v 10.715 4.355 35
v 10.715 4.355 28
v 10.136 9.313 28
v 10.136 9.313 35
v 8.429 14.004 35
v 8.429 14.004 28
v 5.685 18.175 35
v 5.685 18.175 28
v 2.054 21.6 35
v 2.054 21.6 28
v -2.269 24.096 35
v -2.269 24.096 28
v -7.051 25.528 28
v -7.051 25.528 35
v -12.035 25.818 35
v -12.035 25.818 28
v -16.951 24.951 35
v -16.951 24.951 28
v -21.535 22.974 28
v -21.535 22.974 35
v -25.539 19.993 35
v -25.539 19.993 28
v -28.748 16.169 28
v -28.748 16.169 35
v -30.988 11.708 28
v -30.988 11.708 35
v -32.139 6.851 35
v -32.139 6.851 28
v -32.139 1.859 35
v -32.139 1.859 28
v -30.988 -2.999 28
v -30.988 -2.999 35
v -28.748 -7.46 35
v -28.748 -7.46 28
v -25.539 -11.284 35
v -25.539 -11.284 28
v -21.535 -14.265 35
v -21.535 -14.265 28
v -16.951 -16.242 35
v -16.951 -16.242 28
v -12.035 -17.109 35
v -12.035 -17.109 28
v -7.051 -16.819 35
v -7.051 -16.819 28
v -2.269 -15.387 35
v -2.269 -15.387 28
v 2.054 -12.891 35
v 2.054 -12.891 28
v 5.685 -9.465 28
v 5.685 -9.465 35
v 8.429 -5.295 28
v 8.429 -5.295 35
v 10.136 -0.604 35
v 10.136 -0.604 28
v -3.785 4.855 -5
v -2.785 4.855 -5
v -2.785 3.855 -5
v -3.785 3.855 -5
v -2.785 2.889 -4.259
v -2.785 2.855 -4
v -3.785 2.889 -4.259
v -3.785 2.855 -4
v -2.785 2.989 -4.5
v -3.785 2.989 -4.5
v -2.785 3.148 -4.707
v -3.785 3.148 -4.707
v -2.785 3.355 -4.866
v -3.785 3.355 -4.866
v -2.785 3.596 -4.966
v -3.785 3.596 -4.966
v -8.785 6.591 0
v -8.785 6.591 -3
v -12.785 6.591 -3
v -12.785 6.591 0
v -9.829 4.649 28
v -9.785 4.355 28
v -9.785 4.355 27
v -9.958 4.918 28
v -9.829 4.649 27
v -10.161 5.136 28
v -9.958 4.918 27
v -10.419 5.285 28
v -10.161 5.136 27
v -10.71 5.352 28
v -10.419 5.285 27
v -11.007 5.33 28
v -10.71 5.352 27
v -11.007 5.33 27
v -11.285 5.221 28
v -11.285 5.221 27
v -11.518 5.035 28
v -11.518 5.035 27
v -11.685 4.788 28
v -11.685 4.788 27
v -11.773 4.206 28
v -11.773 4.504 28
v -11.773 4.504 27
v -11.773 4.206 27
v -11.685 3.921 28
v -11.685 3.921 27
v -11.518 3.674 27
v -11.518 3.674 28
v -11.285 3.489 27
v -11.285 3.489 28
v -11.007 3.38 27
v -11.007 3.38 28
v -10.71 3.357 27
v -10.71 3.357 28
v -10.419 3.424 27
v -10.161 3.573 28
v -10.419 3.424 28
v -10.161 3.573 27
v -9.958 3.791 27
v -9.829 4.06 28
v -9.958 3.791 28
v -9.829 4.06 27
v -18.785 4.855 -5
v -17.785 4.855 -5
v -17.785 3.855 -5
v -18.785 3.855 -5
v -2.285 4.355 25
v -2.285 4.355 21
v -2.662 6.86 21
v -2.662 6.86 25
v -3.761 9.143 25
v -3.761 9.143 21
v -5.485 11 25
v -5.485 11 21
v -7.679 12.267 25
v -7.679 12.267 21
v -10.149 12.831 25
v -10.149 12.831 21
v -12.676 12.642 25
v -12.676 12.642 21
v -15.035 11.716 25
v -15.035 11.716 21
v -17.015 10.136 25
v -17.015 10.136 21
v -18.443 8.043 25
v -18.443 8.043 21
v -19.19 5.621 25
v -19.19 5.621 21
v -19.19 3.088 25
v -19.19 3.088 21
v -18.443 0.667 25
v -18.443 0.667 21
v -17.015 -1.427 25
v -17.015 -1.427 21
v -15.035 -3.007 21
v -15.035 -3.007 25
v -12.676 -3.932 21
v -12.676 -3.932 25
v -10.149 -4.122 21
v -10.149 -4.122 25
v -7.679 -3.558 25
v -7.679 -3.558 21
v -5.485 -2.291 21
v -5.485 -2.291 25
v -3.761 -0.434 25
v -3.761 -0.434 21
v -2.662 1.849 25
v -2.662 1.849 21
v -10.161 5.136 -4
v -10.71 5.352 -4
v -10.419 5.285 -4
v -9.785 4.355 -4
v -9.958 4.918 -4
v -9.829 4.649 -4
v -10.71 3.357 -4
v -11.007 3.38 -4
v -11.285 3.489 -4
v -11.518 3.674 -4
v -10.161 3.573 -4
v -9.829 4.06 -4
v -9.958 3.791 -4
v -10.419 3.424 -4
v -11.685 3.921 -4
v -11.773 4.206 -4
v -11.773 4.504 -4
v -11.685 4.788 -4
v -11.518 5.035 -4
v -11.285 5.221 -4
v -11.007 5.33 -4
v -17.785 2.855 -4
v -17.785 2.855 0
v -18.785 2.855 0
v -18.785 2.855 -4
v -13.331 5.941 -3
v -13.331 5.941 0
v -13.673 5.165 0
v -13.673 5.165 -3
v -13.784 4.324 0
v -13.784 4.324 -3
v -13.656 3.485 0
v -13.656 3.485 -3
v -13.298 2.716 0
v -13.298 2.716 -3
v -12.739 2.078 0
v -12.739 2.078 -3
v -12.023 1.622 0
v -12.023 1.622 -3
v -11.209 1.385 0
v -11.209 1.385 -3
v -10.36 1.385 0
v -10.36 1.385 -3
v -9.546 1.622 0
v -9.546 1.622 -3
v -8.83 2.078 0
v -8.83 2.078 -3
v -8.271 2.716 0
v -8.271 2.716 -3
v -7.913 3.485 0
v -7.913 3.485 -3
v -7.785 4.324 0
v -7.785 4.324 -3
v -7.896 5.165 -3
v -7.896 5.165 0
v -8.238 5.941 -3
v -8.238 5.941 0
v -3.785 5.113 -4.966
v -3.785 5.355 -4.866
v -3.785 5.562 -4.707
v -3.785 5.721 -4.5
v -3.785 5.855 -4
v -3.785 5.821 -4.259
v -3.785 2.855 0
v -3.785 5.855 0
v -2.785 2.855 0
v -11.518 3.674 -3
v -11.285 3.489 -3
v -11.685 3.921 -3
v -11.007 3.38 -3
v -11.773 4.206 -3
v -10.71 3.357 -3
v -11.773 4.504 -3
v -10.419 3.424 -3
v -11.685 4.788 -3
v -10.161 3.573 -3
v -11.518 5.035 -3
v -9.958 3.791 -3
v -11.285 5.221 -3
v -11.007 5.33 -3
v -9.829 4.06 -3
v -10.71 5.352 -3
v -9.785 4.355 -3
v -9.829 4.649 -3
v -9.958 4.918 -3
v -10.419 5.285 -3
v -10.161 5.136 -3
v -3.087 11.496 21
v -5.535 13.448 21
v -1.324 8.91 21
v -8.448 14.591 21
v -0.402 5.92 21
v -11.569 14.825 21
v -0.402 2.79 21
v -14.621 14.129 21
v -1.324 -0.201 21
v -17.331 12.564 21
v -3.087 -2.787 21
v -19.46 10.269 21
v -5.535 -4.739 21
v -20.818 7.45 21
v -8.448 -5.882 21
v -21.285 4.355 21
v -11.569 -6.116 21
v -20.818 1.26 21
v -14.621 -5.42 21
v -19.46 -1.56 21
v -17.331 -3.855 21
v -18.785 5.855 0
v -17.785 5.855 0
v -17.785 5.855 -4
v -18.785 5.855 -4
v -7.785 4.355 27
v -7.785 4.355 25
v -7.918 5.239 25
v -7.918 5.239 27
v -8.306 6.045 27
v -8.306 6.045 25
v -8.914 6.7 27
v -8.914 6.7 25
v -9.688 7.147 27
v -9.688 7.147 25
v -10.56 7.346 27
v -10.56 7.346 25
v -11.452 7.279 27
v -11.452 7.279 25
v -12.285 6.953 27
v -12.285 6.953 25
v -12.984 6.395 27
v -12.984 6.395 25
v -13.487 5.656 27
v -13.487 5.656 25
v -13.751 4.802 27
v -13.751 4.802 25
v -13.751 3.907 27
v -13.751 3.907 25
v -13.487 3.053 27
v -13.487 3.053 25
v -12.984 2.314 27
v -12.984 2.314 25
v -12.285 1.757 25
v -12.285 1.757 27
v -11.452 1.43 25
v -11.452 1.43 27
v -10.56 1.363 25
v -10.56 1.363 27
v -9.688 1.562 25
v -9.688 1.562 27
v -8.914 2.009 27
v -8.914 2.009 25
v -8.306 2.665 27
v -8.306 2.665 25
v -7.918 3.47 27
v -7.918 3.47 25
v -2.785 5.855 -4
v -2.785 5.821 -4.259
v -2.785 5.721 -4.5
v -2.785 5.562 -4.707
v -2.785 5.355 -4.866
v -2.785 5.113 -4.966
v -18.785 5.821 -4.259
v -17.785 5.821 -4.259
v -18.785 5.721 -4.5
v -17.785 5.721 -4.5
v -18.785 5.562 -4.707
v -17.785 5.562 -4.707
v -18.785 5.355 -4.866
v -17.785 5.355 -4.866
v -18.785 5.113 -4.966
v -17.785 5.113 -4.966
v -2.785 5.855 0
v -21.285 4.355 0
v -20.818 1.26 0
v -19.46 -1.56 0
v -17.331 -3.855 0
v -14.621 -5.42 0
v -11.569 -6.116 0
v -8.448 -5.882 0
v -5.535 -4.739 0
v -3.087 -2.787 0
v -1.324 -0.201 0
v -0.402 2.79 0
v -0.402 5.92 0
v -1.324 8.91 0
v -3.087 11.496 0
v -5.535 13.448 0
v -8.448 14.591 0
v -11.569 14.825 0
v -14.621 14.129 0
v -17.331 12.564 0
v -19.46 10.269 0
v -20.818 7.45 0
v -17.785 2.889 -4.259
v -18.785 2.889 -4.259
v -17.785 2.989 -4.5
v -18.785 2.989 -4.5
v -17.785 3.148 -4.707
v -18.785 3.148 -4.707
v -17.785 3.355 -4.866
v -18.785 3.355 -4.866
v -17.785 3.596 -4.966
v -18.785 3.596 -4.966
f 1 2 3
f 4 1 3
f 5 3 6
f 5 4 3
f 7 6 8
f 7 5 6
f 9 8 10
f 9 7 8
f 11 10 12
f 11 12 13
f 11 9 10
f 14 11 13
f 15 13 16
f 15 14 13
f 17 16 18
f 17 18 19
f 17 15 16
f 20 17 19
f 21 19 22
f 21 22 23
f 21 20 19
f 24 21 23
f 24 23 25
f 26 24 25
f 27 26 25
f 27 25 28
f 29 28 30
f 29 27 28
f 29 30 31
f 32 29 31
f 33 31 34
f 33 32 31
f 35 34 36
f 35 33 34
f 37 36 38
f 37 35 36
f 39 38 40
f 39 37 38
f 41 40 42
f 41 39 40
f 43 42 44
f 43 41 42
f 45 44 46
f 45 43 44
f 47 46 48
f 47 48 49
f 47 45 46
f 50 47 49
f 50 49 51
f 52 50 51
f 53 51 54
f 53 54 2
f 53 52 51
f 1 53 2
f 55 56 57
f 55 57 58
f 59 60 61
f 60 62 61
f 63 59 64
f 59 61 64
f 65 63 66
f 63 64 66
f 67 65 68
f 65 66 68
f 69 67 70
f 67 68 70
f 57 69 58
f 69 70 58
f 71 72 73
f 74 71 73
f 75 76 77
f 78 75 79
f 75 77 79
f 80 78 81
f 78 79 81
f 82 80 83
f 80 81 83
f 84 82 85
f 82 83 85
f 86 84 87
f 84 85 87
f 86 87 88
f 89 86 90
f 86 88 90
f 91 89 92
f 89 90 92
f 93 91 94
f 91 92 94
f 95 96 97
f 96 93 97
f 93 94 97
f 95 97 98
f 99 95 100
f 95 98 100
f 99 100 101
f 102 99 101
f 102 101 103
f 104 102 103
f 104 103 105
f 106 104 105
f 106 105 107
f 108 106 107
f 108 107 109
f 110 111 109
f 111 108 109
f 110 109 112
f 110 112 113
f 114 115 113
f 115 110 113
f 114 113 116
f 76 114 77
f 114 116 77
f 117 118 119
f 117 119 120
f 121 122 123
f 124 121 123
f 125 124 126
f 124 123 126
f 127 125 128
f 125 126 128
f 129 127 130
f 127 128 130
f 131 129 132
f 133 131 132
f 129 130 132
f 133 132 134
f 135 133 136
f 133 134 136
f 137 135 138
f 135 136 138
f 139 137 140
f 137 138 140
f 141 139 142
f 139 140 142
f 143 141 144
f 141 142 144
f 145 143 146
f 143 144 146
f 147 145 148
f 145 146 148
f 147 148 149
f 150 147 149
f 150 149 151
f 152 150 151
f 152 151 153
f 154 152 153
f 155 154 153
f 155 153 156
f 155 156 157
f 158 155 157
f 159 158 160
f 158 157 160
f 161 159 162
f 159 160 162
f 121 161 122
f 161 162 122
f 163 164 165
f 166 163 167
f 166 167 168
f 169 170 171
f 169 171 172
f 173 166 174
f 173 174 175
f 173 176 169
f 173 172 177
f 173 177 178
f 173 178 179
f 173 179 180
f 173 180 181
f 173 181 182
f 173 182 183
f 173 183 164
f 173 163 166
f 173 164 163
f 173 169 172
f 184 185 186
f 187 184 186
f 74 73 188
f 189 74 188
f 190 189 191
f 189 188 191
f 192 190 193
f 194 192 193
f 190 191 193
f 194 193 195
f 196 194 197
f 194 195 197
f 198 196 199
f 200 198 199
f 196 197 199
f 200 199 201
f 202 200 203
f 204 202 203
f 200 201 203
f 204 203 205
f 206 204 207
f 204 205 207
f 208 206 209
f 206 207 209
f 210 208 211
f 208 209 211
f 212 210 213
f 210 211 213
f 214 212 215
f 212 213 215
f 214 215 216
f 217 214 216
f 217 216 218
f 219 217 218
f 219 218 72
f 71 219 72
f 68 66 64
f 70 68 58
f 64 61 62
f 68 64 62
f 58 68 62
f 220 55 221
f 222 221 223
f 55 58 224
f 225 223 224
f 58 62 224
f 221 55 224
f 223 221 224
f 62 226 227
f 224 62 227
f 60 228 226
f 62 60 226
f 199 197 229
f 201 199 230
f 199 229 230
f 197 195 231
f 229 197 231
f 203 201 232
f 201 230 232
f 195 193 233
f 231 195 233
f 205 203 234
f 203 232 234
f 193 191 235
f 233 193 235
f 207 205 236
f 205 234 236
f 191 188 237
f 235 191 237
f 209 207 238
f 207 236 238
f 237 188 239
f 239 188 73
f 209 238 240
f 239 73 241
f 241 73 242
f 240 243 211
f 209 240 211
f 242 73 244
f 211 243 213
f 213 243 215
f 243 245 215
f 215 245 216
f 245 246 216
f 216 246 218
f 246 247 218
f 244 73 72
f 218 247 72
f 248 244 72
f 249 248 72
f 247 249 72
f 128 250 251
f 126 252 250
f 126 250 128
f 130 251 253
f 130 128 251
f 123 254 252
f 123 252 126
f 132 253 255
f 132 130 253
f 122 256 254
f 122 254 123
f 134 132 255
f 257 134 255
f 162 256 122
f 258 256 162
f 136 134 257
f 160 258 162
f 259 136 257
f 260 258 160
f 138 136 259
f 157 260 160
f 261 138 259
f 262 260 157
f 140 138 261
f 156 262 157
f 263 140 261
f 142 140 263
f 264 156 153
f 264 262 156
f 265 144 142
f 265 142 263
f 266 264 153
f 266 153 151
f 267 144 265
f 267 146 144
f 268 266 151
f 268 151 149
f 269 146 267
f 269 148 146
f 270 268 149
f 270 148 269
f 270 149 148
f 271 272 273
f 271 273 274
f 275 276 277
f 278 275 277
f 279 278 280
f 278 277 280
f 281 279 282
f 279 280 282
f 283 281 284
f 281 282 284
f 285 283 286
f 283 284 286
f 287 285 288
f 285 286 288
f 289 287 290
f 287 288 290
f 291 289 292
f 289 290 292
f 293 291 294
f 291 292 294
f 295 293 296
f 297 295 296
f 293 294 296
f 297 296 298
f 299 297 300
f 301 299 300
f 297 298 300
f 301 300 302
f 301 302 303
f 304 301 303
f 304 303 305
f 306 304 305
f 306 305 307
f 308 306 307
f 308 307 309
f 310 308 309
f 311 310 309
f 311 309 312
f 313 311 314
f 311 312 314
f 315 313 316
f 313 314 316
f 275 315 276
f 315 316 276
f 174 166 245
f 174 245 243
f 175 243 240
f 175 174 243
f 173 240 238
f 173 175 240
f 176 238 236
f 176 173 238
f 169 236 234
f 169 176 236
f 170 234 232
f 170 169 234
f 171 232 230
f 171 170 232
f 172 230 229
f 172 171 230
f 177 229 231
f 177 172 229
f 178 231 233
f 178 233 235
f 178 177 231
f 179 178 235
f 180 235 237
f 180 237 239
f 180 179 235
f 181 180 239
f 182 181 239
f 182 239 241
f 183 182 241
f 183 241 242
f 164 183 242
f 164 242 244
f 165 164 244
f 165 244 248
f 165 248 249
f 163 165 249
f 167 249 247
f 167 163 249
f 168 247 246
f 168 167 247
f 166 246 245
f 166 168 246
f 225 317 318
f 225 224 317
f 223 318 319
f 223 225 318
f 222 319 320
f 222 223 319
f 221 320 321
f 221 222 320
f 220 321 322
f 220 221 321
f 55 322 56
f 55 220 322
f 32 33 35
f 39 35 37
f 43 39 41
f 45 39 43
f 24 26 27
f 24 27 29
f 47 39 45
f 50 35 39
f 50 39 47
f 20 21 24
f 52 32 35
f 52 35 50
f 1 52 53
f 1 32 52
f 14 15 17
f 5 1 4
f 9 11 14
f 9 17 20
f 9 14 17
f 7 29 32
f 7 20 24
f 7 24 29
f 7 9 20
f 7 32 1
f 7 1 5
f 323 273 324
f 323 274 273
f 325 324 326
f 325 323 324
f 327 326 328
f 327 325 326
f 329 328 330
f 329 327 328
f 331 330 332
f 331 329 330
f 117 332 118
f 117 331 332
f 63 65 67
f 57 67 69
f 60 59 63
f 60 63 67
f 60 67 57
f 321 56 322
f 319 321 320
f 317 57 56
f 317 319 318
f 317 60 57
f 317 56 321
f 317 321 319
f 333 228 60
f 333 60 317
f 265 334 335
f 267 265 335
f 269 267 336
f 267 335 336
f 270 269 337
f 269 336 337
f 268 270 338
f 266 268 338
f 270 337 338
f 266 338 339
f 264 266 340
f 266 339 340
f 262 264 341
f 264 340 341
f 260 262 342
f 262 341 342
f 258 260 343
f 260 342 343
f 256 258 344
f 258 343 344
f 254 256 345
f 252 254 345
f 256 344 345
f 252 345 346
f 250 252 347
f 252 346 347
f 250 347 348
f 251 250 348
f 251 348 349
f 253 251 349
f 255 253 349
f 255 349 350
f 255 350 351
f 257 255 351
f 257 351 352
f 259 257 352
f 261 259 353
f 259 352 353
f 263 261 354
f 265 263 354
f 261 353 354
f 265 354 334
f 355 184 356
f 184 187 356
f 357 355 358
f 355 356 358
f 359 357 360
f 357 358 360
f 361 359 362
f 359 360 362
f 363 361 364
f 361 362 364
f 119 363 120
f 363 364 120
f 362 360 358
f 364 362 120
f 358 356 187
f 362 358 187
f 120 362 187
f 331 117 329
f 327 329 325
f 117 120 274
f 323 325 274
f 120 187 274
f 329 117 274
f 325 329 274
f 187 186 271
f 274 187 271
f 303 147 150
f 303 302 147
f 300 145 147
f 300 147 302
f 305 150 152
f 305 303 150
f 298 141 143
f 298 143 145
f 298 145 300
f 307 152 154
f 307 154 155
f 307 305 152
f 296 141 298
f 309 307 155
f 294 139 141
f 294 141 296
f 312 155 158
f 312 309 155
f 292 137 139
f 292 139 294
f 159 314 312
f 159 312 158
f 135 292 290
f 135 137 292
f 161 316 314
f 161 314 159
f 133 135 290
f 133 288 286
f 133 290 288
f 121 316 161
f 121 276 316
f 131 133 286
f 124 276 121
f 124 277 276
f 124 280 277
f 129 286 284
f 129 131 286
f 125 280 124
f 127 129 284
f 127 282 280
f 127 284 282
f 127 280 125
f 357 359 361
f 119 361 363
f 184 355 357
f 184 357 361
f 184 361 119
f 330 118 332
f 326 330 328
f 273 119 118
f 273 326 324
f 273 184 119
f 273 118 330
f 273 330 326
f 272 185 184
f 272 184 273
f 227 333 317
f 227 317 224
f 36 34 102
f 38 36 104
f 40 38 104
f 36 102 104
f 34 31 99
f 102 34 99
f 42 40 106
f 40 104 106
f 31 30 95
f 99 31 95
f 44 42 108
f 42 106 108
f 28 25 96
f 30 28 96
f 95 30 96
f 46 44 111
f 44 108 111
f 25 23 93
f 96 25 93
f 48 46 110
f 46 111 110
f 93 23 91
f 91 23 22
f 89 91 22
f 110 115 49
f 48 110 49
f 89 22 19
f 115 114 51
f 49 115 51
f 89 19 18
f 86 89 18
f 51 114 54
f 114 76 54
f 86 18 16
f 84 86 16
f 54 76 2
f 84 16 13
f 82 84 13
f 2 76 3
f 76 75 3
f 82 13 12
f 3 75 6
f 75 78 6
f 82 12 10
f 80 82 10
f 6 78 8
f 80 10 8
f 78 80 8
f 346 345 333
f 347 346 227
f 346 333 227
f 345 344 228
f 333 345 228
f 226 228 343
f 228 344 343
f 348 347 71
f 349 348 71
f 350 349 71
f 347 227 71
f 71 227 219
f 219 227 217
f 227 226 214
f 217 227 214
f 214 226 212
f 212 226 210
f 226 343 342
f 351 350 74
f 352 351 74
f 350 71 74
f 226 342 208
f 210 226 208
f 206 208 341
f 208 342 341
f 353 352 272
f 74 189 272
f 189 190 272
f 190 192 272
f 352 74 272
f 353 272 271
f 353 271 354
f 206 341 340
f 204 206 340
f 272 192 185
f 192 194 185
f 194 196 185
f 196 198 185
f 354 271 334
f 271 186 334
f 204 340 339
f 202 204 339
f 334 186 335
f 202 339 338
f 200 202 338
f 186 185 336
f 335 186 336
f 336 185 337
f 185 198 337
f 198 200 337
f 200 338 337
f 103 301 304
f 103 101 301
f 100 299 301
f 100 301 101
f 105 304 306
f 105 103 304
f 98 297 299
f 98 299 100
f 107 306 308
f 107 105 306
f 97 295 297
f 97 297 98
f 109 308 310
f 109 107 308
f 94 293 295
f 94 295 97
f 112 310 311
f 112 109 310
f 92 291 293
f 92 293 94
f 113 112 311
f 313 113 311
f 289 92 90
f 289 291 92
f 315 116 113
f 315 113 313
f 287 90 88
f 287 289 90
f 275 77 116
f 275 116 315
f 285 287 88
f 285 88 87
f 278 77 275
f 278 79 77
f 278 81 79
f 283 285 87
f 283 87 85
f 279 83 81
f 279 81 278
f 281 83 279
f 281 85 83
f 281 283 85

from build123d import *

# Parameters (mm, degrees)
ESQUISSE1_R        = 10.5
BOSS_EXTRU_1_DEPTH = 21
ESQUISSE2_R        = 8.5
BOSS_EXTRU_2_DEPTH = 4
ESQUISSE3_R        = 3
BOSS_EXTRU_3_DEPTH = 2
ESQUISSE4_R        = 1
BOSS_EXTRU_4_DEPTH = 8
ESQUISSE5_W        = 1
ESQUISSE5_H        = 3
BOSS_EXTRU_5_DEPTH = 5
CONG_1_R           = 1
BOSS_EXTRU_6_START = 3
BOSS_EXTRU_6_DEPTH = 3
BOSS_EXTRU_7_START = 1
ESQUISSE7_R        = 1
BOSS_EXTRU_7_DEPTH = 1
ESQUISSE8_R        = 21.5
BOSS_EXTRU_8_DEPTH = 7


with BuildPart() as part:
    # Esquisse1 → Boss.-Extru.1 (new body)
    with BuildSketch(Plane.XY):
        with Locations((-10.784512349, 4.354613187)):
            Circle(ESQUISSE1_R)
    extrude(amount=BOSS_EXTRU_1_DEPTH)

    # Esquisse2 → Boss.-Extru.2 (add)
    with BuildSketch(Plane.XY.offset(21)):
        with Locations((-10.784512349, 4.354613187)):
            Circle(ESQUISSE2_R)
    extrude(amount=BOSS_EXTRU_2_DEPTH)

    # Esquisse3 → Boss.-Extru.3 (add)
    with BuildSketch(Plane.XY.offset(25)):
        with Locations((-10.784512349, 4.354613187)):
            Circle(ESQUISSE3_R)
    extrude(amount=BOSS_EXTRU_3_DEPTH)

    # Esquisse4 → Boss.-Extru.4 (add)
    with BuildSketch(Plane.XY.offset(27)):
        with Locations((-10.784512349, 4.354613187)):
            Circle(ESQUISSE4_R)
    extrude(amount=BOSS_EXTRU_4_DEPTH)

    # Esquisse5 → Boss.-Extru.5 (add)
    with BuildSketch(Plane(origin=(0, 0, 0), x_dir=(-1, 0, 0), z_dir=(0, 0, -1))):
        with Locations((18.284512349, 4.354613187)):
            Rectangle(ESQUISSE5_W, ESQUISSE5_H)
        with Locations((3.284512349, 4.354613187)):
            Rectangle(ESQUISSE5_W, ESQUISSE5_H)
    extrude(amount=BOSS_EXTRU_5_DEPTH)

    # Congé1
    cong_1_edges = [part.edges().sort_by_distance(p)[0] for p in [
        (-18.284512349, 2.854613187, -5),
        (-18.284512349, 5.854613187, -5),
        (-3.284512349, 2.854613187, -5),
        (-3.284512349, 5.854613187, -5),
    ]]
    fillet(cong_1_edges, radius=CONG_1_R)

    # Esquisse6 → Boss.-Extru.6 (add)
    with BuildSketch(Plane(origin=(0, 0, 0), x_dir=(-1, 0, 0), z_dir=(0, 0, -1)).offset(BOSS_EXTRU_6_START)):
        with BuildLine():
            Line((8.784512349, 6.590681164), (12.784512349, 6.590681164))
            ThreePointArc((12.784512349, 6.590681164), (10.784512349, 1.354613187), (8.784512349, 6.590681164))
        make_face()
    extrude(amount=-BOSS_EXTRU_6_DEPTH)

    # Esquisse7 → Boss.-Extru.7 (add)
    with BuildSketch(Plane(origin=(0, 0, -3), x_dir=(-1, 0, 0), z_dir=(0, 0, -1)).offset(BOSS_EXTRU_7_START)):
        with Locations((10.784512349, 4.354613187)):
            Circle(ESQUISSE7_R)
    extrude(amount=-BOSS_EXTRU_7_DEPTH)

    # Esquisse8 → Boss.-Extru.8 (add)
    with BuildSketch(Plane.XY.offset(35)):
        with Locations((-10.784512349, 4.354613187)):
            Circle(ESQUISSE8_R)
    extrude(amount=-BOSS_EXTRU_8_DEPTH)


solid = part.part
